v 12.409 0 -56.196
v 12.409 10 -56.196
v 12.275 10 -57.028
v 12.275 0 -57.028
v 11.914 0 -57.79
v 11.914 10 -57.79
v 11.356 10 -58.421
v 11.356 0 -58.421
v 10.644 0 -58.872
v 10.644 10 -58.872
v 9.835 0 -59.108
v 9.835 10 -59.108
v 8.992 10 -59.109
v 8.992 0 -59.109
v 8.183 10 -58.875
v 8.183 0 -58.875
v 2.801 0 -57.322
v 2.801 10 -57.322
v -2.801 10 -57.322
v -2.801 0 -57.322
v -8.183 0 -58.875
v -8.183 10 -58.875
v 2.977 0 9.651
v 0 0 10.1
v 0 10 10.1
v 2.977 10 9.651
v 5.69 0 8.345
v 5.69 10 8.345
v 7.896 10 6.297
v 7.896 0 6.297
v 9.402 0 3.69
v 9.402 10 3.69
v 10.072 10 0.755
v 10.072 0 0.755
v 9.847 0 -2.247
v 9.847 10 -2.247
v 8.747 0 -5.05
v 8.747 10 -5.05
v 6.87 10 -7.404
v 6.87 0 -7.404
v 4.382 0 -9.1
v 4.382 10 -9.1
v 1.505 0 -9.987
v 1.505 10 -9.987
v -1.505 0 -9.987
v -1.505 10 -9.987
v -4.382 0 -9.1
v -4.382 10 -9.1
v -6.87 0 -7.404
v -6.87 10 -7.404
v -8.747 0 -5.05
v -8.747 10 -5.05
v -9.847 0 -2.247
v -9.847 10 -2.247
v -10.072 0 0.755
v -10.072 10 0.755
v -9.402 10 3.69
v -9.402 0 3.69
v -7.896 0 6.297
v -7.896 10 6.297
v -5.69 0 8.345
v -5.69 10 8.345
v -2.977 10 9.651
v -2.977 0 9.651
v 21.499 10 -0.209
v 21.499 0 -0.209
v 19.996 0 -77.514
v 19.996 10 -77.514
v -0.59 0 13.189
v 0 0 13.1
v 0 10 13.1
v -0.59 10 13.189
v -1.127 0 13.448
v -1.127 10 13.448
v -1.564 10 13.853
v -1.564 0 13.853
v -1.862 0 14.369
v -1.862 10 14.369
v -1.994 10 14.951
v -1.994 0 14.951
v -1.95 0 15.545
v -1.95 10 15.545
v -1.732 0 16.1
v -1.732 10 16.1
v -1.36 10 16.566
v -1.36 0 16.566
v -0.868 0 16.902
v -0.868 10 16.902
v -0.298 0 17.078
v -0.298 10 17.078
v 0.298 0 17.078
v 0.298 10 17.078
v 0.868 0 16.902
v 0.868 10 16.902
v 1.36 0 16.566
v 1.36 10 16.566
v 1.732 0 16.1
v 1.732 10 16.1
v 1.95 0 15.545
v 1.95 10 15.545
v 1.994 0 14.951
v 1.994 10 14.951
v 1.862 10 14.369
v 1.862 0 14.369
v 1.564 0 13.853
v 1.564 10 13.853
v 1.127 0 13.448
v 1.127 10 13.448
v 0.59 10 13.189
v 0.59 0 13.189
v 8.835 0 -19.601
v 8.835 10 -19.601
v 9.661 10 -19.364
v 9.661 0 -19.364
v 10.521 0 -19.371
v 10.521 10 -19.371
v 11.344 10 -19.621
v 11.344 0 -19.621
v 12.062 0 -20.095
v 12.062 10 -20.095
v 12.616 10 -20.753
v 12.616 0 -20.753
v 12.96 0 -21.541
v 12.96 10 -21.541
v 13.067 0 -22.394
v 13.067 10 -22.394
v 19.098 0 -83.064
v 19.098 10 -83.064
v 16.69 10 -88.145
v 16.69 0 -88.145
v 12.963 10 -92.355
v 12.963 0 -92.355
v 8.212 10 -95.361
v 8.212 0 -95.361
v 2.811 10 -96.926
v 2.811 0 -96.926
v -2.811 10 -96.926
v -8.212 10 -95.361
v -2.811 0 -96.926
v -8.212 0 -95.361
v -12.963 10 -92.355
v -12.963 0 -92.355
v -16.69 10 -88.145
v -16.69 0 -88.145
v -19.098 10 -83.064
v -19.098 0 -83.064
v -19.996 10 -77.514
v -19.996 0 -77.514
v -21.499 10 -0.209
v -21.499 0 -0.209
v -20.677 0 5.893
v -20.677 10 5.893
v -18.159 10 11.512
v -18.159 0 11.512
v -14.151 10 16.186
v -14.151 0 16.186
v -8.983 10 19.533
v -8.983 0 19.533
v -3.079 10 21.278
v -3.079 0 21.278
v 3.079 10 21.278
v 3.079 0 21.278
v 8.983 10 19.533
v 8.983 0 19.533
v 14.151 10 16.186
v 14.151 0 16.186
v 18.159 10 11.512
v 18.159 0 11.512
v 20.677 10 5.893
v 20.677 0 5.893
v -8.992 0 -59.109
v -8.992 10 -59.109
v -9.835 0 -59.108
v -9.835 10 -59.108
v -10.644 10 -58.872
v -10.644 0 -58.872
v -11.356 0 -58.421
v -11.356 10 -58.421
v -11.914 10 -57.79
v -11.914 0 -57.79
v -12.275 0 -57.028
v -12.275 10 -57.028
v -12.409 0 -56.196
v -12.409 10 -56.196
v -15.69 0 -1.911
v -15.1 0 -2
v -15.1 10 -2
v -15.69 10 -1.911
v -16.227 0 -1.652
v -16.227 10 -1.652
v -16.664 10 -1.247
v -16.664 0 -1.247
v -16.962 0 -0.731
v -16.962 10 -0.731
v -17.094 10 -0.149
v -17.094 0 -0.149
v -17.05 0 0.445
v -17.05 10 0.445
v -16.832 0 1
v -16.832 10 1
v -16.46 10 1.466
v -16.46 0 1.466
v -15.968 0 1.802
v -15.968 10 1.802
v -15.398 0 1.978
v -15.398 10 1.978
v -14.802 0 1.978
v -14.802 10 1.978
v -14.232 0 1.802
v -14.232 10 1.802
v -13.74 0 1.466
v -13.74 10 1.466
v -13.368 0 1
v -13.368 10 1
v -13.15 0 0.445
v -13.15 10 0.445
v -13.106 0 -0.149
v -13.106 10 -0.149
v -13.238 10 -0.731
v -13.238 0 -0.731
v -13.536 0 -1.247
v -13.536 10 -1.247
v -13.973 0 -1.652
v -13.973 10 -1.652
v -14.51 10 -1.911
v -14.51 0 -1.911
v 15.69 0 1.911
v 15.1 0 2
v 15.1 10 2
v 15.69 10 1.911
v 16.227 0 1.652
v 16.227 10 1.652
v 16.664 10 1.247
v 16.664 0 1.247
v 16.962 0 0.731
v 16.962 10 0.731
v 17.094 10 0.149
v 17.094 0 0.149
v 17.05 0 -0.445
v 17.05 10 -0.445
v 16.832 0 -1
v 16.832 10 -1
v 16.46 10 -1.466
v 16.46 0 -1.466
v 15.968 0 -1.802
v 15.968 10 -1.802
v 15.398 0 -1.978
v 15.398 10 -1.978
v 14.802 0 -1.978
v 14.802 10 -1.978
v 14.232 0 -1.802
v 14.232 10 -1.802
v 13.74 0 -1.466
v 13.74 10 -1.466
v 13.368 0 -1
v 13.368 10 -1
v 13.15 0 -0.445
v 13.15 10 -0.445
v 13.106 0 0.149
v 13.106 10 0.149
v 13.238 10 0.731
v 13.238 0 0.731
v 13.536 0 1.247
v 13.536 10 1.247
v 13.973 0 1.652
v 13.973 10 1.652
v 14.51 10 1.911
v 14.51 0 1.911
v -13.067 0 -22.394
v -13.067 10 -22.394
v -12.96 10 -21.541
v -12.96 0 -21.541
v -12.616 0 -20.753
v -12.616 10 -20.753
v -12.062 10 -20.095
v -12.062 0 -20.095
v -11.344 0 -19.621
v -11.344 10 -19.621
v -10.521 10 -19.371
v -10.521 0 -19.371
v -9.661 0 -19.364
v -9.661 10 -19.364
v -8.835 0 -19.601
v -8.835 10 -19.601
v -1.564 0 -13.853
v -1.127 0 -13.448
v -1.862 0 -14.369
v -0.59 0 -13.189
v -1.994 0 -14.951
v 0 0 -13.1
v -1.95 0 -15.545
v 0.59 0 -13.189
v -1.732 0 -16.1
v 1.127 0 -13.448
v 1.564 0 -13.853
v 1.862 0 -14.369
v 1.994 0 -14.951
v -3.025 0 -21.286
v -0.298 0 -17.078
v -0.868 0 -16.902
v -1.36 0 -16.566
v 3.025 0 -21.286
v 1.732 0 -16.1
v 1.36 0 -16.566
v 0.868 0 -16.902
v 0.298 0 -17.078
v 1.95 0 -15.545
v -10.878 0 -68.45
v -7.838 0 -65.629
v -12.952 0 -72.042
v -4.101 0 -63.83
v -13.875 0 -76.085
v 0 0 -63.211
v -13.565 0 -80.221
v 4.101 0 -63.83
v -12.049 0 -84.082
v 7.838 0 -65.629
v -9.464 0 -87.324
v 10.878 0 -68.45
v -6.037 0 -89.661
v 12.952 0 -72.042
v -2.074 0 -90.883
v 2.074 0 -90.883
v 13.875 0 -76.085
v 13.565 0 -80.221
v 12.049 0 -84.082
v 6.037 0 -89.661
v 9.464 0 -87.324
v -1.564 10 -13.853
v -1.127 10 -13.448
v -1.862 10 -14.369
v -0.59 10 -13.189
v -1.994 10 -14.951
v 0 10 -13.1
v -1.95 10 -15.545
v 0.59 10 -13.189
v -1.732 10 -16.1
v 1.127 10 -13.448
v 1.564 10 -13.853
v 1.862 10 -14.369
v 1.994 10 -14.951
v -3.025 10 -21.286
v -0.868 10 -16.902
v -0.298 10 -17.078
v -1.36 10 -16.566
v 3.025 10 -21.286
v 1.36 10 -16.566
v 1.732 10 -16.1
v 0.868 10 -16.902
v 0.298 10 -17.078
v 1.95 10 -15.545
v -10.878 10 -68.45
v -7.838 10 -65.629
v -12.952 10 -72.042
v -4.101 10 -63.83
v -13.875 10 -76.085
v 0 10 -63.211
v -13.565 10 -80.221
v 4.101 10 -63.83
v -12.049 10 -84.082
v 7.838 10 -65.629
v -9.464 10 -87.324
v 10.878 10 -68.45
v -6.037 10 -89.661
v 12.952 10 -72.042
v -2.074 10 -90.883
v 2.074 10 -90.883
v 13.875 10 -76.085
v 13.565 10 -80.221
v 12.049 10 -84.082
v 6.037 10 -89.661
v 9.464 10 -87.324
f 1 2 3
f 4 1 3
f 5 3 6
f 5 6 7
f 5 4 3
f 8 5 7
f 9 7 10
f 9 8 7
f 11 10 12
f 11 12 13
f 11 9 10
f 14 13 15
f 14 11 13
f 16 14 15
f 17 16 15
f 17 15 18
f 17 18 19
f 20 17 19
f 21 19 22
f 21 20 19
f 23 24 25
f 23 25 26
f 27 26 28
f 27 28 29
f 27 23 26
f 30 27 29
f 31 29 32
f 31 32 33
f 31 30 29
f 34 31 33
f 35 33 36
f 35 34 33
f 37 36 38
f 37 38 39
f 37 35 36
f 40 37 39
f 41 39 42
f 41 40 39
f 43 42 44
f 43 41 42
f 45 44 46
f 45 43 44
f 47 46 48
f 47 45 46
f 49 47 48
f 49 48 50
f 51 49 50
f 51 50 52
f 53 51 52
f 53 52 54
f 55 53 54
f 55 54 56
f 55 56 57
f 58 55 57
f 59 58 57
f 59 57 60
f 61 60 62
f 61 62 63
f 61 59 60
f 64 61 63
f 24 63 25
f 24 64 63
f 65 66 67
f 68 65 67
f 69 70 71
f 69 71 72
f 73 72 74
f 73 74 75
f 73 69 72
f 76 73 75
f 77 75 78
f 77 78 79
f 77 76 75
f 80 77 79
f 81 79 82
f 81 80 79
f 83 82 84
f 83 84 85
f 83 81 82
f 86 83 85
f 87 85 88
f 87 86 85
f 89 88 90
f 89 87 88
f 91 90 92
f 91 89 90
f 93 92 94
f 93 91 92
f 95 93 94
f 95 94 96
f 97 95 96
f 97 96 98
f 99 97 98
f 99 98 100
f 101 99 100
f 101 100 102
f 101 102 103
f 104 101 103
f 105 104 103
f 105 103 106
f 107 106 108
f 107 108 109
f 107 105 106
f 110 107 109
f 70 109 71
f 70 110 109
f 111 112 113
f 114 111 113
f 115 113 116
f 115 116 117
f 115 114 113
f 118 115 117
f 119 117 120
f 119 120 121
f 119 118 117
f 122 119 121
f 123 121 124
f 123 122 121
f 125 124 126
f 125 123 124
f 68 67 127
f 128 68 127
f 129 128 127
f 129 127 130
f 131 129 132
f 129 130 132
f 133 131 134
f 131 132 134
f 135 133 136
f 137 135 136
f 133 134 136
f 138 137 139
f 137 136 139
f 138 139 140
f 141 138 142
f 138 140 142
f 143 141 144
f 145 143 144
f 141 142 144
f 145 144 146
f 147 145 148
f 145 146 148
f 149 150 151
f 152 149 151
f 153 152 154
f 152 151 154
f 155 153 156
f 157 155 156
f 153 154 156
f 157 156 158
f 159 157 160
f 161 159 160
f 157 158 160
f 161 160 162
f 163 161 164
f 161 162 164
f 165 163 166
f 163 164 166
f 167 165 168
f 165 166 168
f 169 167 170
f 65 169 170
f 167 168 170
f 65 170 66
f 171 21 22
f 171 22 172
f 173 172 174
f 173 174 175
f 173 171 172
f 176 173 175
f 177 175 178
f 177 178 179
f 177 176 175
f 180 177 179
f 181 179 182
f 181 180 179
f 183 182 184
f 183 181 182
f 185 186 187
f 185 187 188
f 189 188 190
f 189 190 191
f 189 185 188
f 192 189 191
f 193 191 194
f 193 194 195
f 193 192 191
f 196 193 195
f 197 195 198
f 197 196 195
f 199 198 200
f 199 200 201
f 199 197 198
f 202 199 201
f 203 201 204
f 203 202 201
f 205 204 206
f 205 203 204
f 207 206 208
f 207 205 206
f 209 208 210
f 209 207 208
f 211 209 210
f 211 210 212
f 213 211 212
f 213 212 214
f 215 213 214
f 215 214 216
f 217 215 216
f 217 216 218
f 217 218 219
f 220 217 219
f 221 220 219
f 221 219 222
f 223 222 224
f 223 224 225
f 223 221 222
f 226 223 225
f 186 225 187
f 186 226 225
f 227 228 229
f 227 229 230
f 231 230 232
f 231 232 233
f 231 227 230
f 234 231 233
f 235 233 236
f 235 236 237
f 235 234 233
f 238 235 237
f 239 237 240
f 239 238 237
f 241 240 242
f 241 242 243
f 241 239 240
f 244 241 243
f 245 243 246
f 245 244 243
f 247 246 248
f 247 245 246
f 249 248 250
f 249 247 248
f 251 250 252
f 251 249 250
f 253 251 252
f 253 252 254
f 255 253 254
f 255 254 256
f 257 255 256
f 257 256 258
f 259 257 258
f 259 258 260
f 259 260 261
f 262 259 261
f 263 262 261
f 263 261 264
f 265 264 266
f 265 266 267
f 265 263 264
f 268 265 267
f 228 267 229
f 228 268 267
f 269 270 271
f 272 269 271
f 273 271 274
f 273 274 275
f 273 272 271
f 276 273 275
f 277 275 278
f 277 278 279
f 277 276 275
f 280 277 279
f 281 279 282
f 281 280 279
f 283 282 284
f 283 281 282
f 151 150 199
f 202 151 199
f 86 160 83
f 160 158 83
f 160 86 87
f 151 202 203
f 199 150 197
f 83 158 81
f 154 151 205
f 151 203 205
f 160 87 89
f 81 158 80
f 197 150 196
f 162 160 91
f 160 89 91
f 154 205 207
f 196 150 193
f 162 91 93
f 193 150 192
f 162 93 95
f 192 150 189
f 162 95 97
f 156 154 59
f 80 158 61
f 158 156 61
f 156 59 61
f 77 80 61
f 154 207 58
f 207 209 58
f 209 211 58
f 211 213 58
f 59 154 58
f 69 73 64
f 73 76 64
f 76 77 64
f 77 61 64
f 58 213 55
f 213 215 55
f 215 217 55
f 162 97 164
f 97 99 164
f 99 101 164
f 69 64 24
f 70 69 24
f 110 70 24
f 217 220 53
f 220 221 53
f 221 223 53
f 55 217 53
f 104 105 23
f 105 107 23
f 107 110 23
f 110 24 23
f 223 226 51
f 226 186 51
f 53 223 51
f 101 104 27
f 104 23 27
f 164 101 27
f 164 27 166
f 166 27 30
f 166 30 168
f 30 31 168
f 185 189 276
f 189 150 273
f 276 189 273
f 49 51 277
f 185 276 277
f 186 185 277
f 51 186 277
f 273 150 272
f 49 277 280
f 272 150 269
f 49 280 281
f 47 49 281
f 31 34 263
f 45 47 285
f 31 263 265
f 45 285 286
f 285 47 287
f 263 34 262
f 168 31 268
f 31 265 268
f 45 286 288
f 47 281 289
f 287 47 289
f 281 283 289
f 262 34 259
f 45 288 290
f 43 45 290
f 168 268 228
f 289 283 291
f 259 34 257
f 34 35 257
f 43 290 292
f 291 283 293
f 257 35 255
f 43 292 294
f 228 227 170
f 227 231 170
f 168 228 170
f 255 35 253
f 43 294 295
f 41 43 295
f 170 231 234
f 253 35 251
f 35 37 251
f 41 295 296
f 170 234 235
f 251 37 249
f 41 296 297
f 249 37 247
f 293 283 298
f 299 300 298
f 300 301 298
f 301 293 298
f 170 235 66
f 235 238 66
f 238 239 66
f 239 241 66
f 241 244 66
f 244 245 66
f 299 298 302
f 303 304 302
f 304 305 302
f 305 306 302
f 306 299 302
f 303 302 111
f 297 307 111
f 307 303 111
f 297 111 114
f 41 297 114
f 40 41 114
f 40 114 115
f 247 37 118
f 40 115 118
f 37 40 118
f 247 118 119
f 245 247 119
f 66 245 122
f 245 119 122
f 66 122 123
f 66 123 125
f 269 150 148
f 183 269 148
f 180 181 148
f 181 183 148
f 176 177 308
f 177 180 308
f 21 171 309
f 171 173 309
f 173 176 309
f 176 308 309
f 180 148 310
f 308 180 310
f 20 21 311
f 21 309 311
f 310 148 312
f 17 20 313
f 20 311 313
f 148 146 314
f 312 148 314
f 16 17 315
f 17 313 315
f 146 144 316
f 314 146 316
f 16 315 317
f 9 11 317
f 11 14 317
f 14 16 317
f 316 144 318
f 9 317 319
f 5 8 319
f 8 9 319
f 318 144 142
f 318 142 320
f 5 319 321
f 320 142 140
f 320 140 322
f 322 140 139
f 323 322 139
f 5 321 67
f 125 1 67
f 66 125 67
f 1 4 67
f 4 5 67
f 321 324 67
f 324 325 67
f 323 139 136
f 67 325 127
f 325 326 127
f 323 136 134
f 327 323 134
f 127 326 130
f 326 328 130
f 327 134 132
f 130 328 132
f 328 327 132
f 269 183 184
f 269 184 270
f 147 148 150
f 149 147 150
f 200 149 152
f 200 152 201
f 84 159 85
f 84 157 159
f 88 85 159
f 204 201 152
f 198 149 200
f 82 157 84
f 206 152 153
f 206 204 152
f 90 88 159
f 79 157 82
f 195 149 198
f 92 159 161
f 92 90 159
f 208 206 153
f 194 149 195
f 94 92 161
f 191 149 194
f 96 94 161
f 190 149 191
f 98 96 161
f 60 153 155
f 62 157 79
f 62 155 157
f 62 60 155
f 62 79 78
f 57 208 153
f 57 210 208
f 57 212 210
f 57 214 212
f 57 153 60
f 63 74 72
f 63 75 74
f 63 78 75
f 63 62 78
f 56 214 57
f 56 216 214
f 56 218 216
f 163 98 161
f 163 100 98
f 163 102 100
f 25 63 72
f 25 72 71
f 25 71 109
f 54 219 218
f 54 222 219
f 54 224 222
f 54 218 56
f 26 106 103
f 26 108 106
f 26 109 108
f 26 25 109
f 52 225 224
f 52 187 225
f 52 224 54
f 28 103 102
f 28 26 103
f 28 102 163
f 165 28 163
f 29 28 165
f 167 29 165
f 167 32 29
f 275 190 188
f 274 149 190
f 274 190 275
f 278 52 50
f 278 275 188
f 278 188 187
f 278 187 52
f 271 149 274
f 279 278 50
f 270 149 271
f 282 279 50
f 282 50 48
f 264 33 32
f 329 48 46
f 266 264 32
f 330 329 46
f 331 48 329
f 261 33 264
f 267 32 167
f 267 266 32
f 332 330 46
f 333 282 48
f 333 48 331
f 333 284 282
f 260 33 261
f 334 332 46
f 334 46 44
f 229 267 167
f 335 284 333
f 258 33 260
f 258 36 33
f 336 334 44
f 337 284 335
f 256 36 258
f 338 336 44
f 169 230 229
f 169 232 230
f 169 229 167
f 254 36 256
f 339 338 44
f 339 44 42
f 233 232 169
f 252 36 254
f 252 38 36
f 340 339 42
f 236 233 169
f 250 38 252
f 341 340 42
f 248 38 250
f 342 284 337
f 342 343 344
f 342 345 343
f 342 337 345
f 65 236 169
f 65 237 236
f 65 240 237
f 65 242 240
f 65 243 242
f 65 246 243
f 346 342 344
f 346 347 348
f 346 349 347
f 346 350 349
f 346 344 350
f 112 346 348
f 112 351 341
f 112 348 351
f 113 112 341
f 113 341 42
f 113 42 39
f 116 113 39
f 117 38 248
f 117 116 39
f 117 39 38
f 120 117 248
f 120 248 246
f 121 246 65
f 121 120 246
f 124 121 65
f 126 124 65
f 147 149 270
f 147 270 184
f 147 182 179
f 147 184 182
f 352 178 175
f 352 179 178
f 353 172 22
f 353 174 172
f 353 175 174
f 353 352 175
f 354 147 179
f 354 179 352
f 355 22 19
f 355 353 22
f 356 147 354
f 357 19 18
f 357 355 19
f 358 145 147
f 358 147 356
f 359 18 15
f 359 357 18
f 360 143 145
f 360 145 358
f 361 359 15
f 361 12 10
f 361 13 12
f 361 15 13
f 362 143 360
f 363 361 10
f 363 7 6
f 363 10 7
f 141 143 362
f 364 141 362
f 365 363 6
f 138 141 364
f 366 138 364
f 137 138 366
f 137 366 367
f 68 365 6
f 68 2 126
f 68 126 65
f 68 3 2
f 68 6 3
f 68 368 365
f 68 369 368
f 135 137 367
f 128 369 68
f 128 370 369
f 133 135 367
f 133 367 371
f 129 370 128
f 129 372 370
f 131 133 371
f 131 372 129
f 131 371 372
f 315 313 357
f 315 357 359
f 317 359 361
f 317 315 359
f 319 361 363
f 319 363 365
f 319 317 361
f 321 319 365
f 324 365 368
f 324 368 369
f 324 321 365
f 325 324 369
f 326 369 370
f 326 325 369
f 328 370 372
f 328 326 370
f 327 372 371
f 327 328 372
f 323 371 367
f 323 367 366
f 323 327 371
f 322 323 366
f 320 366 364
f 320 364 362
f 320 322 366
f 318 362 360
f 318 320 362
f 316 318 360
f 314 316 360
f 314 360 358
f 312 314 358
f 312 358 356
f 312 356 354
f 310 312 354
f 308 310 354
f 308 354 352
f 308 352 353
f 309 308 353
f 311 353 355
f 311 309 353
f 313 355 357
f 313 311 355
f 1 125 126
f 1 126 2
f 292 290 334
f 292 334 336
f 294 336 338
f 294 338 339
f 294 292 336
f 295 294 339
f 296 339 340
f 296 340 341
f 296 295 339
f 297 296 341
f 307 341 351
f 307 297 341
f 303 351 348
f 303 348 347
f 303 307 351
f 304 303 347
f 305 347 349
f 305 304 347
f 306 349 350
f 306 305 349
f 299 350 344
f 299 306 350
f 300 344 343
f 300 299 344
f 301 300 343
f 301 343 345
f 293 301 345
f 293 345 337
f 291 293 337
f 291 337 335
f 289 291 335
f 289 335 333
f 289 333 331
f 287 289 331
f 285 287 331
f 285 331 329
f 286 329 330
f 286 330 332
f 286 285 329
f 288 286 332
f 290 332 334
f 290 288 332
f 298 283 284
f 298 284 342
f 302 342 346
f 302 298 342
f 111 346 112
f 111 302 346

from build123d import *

# Parameters (mm, degrees)
SKETCH1_R           = 13.91353128
SKETCH1_R_2         = 2
SKETCH1_R_3         = 10.1
BOSS_EXTRUDE1_DEPTH = 10


with BuildPart() as part:
    # Sketch1 → Boss-Extrude1 (new body)
    with BuildSketch(Plane(origin=(0, 0, 0), x_dir=(1, 0, 0), z_dir=(0, 1, 0))):
        with BuildLine():
            Line((21.498983302, 0.209086062), (19.99622214, 77.513715994))
            ThreePointArc((19.99622214, 77.513715994), (0, 97.125), (-19.99622214, 77.513715994))
            Line((-19.99622214, 77.513715994), (-21.498983302, 0.209086062))
            ThreePointArc((-21.498983302, 0.209086062), (0, -21.5), (21.498983302, 0.209086062))
        make_face()
        with Locations(Location((0, 77.125, 0), (0, 0, 270))):
            Circle(SKETCH1_R, mode=Mode.SUBTRACT)
        with Locations(Location((0, 15.1, 0), (0, 0, 270))):
            Circle(SKETCH1_R_2, mode=Mode.SUBTRACT)
        with Locations(Location((15.1, 0, 0), (0, 0, 270))):
            Circle(SKETCH1_R_2, mode=Mode.SUBTRACT)
        with Locations(Location((0, -15.1, 0), (0, 0, 90))):
            Circle(SKETCH1_R_2, mode=Mode.SUBTRACT)
        with Locations(Location((0, 0, 0), (0, 0, 270))):
            Circle(SKETCH1_R_3, mode=Mode.SUBTRACT)
        with Locations(Location((-15.1, 0, 0), (0, 0, 90))):
            Circle(SKETCH1_R_2, mode=Mode.SUBTRACT)
        with BuildLine():
            Line((13.06692571, 22.394317415), (12.409386822, 56.196380392))
            ThreePointArc((12.409386822, 56.196380392), (11.016008446, 58.671921864), (8.182568929, 58.875463959))
            ThreePointArc((8.182568929, 58.875463959), (0, 57.125), (-8.182568929, 58.875463959))
            ThreePointArc((-8.182568929, 58.875463959), (-11.016008446, 58.671921864), (-12.409386822, 56.196380392))
            Line((-12.409386822, 56.196380392), (-13.06692571, 22.394317415))
            ThreePointArc((-13.06692571, 22.394317415), (-11.720069374, 19.832175089), (-8.834738892, 19.600953771))
            ThreePointArc((-8.834738892, 19.600953771), (0, 21.5), (8.834738892, 19.600953771))
            ThreePointArc((8.834738892, 19.600953771), (11.720069374, 19.832175089), (13.06692571, 22.394317415))
        make_face(mode=Mode.SUBTRACT)
    extrude(amount=BOSS_EXTRUDE1_DEPTH)


solid = part.part
